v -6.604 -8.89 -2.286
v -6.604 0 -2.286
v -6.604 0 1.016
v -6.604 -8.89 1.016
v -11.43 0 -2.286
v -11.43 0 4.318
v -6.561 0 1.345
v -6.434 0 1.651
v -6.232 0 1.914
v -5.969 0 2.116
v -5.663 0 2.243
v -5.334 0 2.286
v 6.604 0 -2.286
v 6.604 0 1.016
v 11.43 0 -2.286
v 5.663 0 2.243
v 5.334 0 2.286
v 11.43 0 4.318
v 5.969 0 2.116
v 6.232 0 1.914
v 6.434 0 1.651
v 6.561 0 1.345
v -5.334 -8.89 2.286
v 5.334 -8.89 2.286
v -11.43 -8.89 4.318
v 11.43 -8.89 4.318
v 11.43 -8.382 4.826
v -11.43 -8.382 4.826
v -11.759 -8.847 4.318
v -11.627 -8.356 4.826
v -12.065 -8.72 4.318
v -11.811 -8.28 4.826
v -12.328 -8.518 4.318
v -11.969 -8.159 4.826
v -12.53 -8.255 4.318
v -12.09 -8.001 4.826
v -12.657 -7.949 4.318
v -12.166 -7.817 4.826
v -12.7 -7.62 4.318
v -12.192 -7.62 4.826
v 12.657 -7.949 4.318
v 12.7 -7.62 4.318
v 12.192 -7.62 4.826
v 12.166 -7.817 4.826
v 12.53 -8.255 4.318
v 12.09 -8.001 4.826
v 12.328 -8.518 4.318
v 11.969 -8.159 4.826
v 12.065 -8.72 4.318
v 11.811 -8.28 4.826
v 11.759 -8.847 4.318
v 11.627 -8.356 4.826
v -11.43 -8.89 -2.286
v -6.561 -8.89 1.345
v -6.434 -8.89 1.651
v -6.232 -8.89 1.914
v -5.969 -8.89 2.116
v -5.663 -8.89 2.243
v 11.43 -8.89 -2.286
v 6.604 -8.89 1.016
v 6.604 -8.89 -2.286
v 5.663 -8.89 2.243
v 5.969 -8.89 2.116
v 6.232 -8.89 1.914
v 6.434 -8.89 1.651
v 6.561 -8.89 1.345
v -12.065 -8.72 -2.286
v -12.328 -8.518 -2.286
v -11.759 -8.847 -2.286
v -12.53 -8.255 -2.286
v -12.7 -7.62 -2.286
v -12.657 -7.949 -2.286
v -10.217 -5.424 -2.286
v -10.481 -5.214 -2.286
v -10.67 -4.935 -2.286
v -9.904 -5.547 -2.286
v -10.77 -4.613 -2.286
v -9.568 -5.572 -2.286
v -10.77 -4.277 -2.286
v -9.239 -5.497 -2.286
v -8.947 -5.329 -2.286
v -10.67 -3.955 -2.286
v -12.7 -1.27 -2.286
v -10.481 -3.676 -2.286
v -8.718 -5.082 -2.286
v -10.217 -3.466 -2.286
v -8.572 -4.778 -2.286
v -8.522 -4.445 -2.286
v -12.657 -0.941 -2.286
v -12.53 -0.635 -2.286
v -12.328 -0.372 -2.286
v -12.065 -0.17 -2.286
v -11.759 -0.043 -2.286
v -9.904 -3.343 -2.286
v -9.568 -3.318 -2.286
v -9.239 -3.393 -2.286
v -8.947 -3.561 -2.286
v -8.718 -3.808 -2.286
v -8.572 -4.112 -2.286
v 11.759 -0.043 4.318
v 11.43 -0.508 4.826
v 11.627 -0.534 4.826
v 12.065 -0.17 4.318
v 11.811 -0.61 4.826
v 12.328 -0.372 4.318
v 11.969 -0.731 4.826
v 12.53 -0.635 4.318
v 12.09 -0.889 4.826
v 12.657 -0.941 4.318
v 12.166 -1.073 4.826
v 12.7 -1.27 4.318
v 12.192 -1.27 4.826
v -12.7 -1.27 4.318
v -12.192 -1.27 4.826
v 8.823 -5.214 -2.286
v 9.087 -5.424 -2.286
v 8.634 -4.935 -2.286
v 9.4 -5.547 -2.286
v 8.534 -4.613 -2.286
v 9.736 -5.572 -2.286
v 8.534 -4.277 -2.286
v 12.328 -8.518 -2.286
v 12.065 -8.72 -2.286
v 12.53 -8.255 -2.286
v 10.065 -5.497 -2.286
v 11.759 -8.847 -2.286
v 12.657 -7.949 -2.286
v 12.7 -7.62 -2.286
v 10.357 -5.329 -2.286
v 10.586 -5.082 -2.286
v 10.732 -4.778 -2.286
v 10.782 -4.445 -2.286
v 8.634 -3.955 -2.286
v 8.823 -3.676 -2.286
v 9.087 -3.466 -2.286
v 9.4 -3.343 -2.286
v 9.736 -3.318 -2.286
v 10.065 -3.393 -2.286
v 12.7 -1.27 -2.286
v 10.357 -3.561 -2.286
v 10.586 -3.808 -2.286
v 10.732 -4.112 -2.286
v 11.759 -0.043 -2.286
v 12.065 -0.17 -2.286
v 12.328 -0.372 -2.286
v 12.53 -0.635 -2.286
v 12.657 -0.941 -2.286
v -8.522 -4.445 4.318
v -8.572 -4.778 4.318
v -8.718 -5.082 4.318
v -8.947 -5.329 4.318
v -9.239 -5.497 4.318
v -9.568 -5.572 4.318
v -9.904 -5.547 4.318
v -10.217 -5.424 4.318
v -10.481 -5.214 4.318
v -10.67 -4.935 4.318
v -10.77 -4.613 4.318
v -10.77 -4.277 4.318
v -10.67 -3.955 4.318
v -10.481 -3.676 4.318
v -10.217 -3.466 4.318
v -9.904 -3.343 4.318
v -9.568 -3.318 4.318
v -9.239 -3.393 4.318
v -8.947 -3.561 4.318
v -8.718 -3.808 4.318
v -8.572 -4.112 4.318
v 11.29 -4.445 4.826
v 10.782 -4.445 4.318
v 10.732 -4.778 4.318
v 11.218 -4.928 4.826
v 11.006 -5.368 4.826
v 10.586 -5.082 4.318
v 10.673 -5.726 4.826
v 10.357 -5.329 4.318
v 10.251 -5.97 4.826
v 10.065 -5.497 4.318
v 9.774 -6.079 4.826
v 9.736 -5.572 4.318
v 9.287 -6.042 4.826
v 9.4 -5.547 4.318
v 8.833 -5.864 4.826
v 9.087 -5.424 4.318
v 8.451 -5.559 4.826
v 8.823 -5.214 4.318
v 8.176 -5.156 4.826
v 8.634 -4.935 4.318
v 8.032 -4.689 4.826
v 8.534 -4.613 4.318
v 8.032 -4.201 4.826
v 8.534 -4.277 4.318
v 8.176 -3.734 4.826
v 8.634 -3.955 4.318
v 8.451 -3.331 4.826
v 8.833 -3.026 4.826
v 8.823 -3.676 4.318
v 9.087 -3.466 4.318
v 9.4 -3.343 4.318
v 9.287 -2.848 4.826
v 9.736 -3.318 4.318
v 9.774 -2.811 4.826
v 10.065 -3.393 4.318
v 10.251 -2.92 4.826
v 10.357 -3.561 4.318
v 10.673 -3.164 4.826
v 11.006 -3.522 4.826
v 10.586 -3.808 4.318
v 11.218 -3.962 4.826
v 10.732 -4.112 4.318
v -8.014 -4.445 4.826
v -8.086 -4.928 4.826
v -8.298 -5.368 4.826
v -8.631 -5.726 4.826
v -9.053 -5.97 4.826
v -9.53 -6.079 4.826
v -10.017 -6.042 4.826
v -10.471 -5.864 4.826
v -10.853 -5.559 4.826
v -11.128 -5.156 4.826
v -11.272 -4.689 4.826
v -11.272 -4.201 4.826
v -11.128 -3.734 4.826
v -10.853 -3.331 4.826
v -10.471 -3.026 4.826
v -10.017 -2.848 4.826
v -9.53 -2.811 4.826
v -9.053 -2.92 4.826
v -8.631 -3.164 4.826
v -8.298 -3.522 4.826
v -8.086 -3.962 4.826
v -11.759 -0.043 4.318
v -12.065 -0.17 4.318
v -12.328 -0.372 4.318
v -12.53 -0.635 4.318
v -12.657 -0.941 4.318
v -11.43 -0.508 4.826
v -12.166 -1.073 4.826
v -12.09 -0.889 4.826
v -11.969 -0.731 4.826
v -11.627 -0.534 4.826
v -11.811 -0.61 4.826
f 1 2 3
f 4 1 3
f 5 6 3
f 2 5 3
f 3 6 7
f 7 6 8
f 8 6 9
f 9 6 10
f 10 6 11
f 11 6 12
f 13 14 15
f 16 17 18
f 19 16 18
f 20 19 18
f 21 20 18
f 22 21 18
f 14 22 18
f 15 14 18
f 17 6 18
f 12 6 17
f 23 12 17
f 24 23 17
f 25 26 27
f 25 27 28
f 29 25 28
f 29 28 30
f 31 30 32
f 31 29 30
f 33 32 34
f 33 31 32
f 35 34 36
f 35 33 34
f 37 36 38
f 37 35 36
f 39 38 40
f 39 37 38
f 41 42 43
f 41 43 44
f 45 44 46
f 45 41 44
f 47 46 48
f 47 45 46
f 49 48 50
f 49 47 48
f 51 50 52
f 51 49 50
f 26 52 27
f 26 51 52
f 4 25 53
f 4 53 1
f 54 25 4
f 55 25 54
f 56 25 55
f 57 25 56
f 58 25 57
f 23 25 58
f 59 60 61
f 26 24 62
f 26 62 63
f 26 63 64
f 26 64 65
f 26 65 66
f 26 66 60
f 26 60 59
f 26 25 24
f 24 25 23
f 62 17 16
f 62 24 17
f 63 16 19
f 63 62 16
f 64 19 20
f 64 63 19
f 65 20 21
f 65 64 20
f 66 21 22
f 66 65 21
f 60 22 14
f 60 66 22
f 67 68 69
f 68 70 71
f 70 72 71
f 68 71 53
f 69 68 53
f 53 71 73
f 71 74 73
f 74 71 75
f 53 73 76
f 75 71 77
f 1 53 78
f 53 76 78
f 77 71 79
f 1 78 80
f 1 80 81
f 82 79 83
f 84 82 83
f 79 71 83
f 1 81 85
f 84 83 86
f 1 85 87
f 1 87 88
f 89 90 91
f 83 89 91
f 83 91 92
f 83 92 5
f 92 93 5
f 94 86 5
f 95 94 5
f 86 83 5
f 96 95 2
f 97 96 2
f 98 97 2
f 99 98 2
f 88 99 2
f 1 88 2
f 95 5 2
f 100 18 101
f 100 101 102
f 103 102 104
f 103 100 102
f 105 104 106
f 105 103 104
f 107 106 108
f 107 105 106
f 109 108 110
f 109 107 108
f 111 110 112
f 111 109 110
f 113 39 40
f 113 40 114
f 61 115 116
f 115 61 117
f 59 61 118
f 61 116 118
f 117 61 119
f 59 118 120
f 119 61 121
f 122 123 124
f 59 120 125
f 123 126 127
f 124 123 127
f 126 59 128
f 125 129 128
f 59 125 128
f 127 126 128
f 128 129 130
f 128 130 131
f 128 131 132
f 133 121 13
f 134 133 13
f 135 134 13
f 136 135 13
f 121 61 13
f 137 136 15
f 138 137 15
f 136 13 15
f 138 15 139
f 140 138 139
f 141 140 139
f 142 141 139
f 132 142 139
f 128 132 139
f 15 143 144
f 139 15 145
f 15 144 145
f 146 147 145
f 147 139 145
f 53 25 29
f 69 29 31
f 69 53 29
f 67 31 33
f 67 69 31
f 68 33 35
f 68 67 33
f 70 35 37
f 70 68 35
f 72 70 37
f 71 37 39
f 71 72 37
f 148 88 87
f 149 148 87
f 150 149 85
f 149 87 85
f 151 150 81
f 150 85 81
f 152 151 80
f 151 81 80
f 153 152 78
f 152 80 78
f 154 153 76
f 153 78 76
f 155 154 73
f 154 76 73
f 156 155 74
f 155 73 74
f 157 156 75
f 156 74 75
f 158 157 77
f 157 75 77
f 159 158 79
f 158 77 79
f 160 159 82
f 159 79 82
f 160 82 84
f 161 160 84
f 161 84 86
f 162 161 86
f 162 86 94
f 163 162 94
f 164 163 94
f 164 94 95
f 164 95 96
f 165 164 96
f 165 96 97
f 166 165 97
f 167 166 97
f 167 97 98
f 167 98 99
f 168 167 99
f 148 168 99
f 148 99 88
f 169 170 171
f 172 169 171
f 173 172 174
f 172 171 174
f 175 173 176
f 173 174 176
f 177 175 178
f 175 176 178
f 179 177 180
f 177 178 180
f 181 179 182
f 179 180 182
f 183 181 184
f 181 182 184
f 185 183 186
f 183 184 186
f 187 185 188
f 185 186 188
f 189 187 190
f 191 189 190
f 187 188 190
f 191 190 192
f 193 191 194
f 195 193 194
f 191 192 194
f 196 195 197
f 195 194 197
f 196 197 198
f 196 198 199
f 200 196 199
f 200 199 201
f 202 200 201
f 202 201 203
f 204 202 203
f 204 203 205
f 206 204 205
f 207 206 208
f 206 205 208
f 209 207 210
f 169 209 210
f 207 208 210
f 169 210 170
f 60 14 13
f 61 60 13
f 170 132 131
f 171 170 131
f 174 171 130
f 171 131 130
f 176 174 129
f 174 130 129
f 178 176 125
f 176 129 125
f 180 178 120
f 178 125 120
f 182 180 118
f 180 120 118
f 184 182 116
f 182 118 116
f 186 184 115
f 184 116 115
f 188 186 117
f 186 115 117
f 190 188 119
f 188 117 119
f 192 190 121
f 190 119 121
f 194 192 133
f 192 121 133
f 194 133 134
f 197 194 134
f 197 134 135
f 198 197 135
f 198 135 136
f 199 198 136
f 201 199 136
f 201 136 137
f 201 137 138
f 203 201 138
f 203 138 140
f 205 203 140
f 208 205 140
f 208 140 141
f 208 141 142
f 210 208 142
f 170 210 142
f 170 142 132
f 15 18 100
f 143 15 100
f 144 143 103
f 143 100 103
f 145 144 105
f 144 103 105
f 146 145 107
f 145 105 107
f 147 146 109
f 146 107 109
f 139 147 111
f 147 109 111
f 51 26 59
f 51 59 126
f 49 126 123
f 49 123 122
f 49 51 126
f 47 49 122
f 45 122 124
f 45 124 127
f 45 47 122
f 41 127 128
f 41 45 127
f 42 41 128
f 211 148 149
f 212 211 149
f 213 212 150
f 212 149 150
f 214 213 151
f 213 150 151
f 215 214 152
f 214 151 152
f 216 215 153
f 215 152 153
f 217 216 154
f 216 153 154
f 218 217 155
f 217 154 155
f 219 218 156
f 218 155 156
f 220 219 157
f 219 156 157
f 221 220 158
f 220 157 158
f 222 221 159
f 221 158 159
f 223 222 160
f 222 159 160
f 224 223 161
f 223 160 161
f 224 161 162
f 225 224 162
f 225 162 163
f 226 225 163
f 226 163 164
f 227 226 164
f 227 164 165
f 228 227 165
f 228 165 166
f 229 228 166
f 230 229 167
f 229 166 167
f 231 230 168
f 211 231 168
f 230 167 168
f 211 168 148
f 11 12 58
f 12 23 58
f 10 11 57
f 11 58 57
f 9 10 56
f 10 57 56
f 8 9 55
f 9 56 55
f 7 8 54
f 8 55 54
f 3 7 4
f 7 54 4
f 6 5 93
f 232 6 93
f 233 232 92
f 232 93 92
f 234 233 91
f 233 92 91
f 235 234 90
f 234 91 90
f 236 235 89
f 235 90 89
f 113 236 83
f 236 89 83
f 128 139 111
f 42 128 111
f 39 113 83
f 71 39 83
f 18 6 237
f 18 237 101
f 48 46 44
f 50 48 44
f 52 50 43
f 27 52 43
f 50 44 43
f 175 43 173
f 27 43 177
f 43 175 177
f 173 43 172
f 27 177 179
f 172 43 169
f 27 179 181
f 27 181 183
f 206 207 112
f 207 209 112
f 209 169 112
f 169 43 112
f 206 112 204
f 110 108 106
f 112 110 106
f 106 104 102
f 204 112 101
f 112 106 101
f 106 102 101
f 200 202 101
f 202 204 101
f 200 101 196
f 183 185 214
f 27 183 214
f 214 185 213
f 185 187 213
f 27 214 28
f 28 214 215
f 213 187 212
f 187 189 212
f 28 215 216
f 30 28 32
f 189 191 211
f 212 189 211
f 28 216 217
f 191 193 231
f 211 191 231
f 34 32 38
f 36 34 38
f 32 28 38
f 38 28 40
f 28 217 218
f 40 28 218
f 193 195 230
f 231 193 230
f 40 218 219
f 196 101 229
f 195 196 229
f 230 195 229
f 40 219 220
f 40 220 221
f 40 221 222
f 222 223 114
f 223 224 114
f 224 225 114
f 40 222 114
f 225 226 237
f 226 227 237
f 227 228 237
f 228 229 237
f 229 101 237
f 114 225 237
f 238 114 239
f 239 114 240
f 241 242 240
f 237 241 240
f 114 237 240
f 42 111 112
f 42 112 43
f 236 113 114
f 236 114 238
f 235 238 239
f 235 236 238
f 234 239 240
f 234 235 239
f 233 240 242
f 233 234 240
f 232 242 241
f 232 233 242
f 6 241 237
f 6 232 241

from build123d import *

# Parameters (mm, degrees)
F1_DEPTH = 8.89
F2_R     = 1.1303
F3_DEPTH = 25.4
F4_R     = 1.27
F5_SIZE  = 0.508


with BuildPart() as f1:
    # F0 (on Front) → F1 (new body)
    with BuildSketch(Plane.XZ):
        Polygon((-6.604, 2.286), (6.604, 2.286), (6.604, -2.286), (12.7, -2.286), (12.7, 4.826), (-12.7, 4.826), (-12.7, -2.286), (-6.604, -2.286), align=None)
    extrude(amount=F1_DEPTH)

    # F2 (on face) → F3 (cut)
    with BuildSketch(Plane(origin=(0, 0, -2.286), x_dir=(1, 0, 0), z_dir=(0, 0, -1))):
        with Locations((-9.652, 4.445)):
            Circle(F2_R)
        with Locations((9.652, 4.445)):
            Circle(F2_R)
    extrude(amount=-F3_DEPTH, mode=Mode.SUBTRACT)

    # F4
    f4_edges = [f1.edges().sort_by_distance(p)[0] for p in [
        (-6.604, -4.445, 2.286),
        (6.604, -4.445, 2.286),
        (-12.7, 0, 1.27),
        (-12.7, -8.89, 1.27),
        (12.7, -8.89, 1.27),
        (12.7, 0, 1.27),
    ]]
    fillet(f4_edges, radius=F4_R)

    # F5
    f5_edges = [f1.edges().sort_by_distance(p)[0] for p in [
        (12.7, -4.445, 4.826),
        (12.328026, -0.371974, 4.826),
        (12.328026, -8.518026, 4.826),
        (0, 0, 4.826),
        (0, -8.89, 4.826),
        (-12.328026, -0.371974, 4.826),
        (-12.328026, -8.518026, 4.826),
        (-12.7, -4.445, 4.826),
        (8.5217, -4.445, 4.826),
        (-10.7823, -4.445, 4.826),
    ]]
    chamfer(f5_edges, length=F5_SIZE)


solid = f1.part
